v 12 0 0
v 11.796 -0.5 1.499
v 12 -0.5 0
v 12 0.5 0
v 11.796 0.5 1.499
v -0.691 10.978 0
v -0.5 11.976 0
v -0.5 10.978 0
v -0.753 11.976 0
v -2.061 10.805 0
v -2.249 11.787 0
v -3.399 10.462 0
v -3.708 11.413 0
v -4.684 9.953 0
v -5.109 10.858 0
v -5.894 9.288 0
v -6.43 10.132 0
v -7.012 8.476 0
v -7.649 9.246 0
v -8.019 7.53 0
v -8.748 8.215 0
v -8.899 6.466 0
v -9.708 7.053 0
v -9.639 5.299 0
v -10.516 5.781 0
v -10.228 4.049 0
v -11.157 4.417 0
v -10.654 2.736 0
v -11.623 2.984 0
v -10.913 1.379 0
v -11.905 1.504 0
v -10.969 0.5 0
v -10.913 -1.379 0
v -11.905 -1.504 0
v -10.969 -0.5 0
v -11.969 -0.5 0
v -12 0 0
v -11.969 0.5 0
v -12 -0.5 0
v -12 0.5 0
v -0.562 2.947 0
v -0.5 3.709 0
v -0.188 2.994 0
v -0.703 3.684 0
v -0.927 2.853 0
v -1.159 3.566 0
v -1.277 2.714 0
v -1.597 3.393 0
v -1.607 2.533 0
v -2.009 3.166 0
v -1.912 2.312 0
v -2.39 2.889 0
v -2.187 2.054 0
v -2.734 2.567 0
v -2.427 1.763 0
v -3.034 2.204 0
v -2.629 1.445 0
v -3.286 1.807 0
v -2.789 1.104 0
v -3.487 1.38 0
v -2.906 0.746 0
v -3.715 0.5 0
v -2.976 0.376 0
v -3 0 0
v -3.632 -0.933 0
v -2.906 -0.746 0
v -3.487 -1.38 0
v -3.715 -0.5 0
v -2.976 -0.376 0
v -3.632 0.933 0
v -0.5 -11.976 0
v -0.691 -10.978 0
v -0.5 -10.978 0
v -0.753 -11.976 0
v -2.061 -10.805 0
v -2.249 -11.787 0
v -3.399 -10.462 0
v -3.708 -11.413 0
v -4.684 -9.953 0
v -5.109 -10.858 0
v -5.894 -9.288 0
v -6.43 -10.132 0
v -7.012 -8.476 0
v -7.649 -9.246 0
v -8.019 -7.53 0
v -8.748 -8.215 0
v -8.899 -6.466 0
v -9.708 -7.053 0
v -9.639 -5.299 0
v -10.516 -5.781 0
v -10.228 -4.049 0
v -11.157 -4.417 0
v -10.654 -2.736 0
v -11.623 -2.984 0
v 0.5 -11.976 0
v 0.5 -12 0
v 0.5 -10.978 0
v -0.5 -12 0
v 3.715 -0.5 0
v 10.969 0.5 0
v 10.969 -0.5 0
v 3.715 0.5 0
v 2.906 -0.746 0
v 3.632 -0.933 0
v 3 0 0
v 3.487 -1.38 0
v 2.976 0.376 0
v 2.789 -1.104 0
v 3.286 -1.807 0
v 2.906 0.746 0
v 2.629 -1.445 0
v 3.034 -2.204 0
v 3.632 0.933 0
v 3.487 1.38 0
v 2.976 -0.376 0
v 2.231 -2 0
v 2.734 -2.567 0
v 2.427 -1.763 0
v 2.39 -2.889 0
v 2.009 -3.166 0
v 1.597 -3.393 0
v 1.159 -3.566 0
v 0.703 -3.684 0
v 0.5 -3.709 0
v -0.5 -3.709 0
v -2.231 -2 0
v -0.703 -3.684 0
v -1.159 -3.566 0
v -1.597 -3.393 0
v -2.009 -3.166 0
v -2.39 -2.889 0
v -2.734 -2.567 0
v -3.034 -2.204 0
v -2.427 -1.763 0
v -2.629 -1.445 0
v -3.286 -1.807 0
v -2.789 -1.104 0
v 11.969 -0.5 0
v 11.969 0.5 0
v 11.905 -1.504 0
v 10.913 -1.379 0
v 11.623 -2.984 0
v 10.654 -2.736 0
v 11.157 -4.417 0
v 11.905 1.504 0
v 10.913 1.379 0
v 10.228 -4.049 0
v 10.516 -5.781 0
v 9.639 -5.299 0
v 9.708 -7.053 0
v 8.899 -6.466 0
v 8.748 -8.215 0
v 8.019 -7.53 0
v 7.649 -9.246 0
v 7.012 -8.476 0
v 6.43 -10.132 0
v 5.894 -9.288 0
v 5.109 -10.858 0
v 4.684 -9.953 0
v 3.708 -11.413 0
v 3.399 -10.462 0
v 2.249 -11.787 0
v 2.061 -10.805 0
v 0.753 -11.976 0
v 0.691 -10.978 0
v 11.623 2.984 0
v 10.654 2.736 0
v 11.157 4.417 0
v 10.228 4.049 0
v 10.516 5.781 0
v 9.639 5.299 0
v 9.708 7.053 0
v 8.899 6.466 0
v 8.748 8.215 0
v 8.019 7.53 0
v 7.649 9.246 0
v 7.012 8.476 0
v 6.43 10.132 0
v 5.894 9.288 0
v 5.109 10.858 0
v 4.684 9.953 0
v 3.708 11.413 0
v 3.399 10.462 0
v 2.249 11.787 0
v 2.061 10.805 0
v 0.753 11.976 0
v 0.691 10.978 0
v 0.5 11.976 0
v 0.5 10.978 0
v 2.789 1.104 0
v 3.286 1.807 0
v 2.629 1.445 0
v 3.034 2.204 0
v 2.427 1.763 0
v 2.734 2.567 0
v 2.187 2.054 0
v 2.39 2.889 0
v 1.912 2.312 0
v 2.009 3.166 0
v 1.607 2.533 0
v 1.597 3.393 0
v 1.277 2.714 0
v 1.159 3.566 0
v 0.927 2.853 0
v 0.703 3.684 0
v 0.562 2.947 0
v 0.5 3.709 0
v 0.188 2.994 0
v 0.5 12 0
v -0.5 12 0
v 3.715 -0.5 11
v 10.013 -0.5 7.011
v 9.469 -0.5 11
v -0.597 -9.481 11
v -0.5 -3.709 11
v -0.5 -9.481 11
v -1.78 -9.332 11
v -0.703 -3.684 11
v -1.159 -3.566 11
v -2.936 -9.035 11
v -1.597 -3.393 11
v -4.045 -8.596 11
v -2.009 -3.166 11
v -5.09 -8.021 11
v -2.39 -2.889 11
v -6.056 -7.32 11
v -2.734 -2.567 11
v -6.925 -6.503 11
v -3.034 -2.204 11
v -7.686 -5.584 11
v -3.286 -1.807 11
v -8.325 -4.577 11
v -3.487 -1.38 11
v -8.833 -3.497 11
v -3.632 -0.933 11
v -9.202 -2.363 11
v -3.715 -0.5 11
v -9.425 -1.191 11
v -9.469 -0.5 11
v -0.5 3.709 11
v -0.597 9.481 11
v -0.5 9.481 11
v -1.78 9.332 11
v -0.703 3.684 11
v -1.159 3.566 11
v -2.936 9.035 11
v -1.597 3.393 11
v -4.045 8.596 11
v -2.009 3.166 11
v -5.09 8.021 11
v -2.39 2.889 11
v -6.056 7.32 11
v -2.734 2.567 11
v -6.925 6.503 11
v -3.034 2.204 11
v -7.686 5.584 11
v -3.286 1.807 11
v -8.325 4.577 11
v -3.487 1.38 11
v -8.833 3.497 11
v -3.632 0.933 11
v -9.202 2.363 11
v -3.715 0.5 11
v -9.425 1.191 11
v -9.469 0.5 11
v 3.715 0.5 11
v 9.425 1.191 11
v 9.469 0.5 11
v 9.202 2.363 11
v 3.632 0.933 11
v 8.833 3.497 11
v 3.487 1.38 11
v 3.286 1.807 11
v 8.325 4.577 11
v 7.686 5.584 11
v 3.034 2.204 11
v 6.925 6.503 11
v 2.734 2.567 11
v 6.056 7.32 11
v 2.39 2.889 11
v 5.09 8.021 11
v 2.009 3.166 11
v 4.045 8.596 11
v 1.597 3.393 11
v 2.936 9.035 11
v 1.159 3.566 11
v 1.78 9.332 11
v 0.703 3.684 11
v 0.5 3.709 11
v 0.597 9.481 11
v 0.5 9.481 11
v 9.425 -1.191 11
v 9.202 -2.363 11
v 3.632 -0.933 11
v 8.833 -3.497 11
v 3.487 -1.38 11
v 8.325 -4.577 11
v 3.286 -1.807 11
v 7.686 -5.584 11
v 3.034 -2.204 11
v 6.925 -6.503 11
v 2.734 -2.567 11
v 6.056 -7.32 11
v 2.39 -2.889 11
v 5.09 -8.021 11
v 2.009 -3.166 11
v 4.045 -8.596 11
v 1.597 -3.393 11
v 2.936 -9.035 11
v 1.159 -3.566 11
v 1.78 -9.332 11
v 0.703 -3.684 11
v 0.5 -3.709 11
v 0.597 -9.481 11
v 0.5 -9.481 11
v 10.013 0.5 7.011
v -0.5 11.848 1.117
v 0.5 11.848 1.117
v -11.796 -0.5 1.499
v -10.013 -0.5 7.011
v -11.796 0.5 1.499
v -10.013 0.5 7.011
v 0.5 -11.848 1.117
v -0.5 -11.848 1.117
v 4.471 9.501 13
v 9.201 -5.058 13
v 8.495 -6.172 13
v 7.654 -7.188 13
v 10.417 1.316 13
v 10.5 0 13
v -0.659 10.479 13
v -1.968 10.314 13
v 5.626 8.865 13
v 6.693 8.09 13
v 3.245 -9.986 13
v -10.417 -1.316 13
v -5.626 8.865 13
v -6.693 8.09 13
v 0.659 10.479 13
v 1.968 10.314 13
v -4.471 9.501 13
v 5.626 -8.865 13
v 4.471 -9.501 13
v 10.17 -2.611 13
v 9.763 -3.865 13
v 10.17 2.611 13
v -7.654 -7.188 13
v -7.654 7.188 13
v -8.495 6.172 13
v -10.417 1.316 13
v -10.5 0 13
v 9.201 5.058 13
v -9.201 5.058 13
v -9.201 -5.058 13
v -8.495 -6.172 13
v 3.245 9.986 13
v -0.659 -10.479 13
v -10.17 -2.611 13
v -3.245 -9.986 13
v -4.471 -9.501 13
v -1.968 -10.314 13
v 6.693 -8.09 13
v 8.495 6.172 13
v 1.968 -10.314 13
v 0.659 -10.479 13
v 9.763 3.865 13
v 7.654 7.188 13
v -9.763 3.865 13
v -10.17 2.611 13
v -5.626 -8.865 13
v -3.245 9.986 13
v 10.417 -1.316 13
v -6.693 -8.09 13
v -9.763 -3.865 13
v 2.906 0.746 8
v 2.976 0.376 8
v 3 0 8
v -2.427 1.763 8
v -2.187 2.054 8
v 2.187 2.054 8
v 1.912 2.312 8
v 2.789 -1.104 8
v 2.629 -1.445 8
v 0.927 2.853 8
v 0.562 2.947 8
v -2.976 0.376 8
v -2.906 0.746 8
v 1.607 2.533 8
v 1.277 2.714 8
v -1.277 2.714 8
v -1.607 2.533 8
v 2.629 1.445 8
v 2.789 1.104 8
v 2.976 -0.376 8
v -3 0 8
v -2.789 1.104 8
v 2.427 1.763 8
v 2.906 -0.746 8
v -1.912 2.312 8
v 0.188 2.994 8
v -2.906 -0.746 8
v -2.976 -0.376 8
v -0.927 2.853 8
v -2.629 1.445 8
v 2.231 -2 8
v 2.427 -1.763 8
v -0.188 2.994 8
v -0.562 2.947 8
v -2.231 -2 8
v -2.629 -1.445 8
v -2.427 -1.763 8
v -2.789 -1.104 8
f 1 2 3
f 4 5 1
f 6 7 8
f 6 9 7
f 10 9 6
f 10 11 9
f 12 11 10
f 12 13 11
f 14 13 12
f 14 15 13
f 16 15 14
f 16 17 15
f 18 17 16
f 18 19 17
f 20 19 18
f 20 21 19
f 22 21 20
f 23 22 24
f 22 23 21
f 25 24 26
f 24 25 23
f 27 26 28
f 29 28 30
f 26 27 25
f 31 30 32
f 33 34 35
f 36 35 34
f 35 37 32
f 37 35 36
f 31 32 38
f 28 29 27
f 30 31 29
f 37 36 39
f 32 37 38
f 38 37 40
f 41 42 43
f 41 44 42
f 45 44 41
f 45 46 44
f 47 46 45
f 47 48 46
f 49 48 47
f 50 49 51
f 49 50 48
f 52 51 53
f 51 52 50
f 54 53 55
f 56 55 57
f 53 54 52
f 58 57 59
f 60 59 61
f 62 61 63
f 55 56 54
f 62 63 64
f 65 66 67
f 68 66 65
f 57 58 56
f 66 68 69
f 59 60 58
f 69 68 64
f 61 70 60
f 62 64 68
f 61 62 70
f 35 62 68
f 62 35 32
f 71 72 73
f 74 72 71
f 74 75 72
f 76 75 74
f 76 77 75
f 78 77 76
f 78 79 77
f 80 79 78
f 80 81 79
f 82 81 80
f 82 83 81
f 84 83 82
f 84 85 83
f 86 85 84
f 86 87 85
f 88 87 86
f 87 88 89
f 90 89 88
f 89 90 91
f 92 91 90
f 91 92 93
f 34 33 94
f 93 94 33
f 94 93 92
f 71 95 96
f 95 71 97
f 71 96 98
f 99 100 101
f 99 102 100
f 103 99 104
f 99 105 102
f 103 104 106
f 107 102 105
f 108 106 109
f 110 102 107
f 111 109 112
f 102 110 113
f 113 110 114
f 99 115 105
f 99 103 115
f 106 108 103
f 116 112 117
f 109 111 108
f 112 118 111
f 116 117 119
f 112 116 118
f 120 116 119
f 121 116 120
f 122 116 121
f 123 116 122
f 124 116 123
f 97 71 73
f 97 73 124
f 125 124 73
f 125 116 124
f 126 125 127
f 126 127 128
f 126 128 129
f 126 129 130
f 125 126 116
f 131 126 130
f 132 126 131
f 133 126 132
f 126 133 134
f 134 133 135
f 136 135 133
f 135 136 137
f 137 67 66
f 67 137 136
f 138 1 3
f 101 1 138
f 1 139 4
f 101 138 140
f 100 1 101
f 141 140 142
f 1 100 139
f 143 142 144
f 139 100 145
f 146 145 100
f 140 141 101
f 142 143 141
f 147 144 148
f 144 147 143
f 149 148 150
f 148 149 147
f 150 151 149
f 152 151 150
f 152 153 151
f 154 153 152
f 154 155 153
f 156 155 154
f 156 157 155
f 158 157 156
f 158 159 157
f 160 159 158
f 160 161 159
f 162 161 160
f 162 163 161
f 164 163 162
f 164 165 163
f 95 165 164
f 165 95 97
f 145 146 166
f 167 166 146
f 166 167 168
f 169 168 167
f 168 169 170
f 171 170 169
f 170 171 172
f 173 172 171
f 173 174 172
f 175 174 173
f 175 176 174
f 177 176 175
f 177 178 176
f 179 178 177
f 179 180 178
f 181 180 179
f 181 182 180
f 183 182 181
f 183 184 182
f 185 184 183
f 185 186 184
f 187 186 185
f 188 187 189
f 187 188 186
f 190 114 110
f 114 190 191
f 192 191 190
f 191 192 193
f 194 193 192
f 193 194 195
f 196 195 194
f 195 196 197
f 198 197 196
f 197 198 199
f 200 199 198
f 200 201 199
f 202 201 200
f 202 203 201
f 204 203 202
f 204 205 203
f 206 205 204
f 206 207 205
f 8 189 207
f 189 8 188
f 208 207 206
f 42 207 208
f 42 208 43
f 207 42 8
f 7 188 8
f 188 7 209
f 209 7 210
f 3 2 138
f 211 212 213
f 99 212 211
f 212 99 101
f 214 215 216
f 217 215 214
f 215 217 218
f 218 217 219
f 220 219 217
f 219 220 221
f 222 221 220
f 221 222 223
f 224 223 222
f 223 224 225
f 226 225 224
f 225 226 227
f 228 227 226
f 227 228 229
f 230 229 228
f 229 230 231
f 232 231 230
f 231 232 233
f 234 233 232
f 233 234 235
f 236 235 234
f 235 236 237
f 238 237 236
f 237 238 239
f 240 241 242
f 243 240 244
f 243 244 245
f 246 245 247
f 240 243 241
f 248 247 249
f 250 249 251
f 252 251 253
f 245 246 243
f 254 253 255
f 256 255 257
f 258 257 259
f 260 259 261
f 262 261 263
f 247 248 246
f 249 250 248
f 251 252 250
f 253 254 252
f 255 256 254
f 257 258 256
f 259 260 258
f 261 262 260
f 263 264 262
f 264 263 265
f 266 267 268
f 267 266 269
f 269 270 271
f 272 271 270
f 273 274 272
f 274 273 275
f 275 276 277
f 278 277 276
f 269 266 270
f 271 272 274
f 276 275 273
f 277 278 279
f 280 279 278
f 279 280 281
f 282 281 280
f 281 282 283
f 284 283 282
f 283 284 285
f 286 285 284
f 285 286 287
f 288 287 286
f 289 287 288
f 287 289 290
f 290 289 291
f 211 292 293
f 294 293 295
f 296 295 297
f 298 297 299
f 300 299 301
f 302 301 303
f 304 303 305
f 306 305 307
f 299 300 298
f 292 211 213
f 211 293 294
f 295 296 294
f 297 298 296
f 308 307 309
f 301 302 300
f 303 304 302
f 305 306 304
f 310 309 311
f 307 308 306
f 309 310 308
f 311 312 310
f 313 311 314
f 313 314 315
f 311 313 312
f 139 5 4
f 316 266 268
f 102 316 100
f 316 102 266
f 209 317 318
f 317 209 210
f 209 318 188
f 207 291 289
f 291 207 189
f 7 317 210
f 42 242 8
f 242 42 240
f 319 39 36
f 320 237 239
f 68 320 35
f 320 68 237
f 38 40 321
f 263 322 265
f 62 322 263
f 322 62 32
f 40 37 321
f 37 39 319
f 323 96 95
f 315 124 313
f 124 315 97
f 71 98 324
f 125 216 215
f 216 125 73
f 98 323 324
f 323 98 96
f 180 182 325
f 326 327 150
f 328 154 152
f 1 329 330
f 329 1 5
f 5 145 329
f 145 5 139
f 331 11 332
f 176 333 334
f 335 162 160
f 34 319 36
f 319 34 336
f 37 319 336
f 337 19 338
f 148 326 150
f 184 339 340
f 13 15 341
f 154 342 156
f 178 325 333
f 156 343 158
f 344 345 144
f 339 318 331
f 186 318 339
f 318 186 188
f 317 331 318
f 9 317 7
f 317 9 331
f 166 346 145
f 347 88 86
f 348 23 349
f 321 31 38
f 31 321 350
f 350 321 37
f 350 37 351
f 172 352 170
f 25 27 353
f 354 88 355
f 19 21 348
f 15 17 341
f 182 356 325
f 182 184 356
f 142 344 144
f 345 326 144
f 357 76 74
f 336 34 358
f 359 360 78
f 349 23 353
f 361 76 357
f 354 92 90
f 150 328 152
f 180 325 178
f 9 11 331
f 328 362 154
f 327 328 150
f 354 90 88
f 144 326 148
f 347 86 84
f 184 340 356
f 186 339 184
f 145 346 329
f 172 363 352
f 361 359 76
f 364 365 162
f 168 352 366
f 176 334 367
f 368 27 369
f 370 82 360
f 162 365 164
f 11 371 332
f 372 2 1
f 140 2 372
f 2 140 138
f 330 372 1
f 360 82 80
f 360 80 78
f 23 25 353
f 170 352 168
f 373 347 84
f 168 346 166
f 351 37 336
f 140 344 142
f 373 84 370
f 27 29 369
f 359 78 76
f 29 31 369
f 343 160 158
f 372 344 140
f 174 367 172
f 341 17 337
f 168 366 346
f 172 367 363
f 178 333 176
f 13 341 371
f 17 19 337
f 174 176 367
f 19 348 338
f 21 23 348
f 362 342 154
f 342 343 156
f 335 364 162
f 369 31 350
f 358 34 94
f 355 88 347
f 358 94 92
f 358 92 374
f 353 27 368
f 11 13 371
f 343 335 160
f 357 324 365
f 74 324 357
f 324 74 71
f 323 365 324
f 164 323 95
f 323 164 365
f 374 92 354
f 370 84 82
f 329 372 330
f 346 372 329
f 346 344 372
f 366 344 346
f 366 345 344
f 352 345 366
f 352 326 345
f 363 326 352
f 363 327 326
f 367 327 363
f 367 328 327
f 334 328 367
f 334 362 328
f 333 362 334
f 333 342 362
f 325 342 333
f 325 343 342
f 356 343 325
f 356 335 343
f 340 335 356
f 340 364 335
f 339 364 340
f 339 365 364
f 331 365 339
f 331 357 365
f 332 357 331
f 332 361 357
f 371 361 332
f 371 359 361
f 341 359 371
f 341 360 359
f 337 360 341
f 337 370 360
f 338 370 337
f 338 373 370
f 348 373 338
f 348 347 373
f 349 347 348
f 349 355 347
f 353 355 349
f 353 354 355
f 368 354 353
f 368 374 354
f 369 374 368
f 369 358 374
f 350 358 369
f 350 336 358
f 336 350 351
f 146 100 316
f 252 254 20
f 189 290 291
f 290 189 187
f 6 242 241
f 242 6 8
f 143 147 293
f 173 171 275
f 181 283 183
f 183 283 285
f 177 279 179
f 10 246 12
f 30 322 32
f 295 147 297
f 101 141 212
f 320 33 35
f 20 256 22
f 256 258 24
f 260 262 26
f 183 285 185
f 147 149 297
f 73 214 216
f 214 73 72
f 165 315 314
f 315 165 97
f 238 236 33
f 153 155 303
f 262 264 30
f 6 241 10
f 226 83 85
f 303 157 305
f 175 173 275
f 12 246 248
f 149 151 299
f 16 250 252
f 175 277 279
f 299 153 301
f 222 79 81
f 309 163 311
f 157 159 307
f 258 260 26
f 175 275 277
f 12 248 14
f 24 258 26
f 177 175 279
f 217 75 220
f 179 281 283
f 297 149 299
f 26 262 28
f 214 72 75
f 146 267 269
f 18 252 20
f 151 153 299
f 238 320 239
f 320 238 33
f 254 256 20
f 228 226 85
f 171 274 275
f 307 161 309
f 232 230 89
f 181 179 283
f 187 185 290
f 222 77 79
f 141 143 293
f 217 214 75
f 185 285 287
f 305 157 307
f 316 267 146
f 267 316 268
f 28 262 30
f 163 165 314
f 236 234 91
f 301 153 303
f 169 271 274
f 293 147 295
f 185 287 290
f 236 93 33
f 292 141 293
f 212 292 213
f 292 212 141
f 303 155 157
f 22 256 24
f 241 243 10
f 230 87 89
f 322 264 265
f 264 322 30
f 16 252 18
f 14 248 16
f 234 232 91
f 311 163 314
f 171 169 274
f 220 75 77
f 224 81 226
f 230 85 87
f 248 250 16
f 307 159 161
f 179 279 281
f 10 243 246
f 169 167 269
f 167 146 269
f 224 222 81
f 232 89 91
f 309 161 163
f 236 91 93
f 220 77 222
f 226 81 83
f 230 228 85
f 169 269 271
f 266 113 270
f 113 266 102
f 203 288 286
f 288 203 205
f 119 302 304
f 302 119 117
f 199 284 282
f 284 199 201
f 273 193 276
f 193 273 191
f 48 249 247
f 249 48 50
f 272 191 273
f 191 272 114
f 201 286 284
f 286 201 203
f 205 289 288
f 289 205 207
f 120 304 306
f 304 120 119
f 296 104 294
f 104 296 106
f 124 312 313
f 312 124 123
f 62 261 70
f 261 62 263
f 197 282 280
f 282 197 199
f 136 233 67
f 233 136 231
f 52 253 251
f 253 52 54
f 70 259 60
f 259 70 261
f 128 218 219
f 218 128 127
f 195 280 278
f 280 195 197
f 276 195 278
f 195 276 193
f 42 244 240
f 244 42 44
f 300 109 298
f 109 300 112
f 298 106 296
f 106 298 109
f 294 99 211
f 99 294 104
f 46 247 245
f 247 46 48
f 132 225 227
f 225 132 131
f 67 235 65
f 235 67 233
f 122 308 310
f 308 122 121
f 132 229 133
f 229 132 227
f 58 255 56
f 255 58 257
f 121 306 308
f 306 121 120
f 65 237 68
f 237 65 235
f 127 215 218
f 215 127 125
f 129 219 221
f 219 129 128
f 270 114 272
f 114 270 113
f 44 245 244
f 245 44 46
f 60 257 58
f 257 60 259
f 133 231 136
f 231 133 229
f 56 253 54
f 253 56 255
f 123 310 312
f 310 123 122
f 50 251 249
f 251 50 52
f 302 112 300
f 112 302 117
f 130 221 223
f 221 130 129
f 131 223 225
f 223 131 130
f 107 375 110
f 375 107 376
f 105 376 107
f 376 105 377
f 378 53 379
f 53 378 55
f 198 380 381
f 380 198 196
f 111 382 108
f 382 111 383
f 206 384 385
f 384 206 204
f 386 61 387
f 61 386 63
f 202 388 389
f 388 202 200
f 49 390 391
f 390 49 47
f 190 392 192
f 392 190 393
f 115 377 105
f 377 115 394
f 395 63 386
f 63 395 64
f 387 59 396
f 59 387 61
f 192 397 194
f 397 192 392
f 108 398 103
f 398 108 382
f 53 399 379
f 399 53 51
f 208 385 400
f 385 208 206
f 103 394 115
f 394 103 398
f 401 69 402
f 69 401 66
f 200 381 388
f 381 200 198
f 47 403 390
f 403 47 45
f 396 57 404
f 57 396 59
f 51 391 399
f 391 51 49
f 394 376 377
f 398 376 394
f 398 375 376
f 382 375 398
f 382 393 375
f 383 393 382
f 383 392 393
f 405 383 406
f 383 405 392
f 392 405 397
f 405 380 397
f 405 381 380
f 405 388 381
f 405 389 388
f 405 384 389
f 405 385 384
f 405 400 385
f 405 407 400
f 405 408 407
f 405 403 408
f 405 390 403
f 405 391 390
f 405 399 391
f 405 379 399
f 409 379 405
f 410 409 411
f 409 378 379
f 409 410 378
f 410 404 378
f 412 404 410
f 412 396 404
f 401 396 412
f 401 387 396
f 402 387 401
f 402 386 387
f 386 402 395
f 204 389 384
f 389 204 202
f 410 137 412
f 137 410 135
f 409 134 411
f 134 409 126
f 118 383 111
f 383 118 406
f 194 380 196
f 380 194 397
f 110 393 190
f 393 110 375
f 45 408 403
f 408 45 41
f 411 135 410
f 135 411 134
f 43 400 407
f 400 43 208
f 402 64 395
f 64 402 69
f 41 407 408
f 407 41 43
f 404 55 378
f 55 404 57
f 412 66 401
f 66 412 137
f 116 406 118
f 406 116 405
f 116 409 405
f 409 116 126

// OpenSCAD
$fn=50;

bottomDiameter = 24;
upperDiameter = 21;
height = 13;

_t = 2;


shaftDiameter=6;
shaftLength=8;
notch=1;


difference() {
    knob();
    shaft();
}

module shaft() {
    difference() {
        cylinder(h=shaftLength,d=shaftDiameter);

        translate([-shaftDiameter/2,-(shaftDiameter/2)-_t+notch,0]) {
            cube([shaftDiameter,_t,height]);
        }
    }
}

module knob() {
    
    for(x=[0:90:360]) {
        rotate([90,0,x])
        linear_extrude(height=_t/2, center=true)
        polygon(points=[
            [(shaftDiameter)/2, 0],
            [(bottomDiameter)/2, 0],
            [(upperDiameter)/2, height-_t],
            [(shaftDiameter)/2, height-_t]
        ]);
    }
    
    difference() {
        cylinder(h=height,d1=bottomDiameter,d2=upperDiameter);
        cylinder(h=height-_t,d1=bottomDiameter-_t,d2=upperDiameter-_t);
    }
    
    

    difference() {
        cylinder(h=13,d=7.5);    
    }
}
